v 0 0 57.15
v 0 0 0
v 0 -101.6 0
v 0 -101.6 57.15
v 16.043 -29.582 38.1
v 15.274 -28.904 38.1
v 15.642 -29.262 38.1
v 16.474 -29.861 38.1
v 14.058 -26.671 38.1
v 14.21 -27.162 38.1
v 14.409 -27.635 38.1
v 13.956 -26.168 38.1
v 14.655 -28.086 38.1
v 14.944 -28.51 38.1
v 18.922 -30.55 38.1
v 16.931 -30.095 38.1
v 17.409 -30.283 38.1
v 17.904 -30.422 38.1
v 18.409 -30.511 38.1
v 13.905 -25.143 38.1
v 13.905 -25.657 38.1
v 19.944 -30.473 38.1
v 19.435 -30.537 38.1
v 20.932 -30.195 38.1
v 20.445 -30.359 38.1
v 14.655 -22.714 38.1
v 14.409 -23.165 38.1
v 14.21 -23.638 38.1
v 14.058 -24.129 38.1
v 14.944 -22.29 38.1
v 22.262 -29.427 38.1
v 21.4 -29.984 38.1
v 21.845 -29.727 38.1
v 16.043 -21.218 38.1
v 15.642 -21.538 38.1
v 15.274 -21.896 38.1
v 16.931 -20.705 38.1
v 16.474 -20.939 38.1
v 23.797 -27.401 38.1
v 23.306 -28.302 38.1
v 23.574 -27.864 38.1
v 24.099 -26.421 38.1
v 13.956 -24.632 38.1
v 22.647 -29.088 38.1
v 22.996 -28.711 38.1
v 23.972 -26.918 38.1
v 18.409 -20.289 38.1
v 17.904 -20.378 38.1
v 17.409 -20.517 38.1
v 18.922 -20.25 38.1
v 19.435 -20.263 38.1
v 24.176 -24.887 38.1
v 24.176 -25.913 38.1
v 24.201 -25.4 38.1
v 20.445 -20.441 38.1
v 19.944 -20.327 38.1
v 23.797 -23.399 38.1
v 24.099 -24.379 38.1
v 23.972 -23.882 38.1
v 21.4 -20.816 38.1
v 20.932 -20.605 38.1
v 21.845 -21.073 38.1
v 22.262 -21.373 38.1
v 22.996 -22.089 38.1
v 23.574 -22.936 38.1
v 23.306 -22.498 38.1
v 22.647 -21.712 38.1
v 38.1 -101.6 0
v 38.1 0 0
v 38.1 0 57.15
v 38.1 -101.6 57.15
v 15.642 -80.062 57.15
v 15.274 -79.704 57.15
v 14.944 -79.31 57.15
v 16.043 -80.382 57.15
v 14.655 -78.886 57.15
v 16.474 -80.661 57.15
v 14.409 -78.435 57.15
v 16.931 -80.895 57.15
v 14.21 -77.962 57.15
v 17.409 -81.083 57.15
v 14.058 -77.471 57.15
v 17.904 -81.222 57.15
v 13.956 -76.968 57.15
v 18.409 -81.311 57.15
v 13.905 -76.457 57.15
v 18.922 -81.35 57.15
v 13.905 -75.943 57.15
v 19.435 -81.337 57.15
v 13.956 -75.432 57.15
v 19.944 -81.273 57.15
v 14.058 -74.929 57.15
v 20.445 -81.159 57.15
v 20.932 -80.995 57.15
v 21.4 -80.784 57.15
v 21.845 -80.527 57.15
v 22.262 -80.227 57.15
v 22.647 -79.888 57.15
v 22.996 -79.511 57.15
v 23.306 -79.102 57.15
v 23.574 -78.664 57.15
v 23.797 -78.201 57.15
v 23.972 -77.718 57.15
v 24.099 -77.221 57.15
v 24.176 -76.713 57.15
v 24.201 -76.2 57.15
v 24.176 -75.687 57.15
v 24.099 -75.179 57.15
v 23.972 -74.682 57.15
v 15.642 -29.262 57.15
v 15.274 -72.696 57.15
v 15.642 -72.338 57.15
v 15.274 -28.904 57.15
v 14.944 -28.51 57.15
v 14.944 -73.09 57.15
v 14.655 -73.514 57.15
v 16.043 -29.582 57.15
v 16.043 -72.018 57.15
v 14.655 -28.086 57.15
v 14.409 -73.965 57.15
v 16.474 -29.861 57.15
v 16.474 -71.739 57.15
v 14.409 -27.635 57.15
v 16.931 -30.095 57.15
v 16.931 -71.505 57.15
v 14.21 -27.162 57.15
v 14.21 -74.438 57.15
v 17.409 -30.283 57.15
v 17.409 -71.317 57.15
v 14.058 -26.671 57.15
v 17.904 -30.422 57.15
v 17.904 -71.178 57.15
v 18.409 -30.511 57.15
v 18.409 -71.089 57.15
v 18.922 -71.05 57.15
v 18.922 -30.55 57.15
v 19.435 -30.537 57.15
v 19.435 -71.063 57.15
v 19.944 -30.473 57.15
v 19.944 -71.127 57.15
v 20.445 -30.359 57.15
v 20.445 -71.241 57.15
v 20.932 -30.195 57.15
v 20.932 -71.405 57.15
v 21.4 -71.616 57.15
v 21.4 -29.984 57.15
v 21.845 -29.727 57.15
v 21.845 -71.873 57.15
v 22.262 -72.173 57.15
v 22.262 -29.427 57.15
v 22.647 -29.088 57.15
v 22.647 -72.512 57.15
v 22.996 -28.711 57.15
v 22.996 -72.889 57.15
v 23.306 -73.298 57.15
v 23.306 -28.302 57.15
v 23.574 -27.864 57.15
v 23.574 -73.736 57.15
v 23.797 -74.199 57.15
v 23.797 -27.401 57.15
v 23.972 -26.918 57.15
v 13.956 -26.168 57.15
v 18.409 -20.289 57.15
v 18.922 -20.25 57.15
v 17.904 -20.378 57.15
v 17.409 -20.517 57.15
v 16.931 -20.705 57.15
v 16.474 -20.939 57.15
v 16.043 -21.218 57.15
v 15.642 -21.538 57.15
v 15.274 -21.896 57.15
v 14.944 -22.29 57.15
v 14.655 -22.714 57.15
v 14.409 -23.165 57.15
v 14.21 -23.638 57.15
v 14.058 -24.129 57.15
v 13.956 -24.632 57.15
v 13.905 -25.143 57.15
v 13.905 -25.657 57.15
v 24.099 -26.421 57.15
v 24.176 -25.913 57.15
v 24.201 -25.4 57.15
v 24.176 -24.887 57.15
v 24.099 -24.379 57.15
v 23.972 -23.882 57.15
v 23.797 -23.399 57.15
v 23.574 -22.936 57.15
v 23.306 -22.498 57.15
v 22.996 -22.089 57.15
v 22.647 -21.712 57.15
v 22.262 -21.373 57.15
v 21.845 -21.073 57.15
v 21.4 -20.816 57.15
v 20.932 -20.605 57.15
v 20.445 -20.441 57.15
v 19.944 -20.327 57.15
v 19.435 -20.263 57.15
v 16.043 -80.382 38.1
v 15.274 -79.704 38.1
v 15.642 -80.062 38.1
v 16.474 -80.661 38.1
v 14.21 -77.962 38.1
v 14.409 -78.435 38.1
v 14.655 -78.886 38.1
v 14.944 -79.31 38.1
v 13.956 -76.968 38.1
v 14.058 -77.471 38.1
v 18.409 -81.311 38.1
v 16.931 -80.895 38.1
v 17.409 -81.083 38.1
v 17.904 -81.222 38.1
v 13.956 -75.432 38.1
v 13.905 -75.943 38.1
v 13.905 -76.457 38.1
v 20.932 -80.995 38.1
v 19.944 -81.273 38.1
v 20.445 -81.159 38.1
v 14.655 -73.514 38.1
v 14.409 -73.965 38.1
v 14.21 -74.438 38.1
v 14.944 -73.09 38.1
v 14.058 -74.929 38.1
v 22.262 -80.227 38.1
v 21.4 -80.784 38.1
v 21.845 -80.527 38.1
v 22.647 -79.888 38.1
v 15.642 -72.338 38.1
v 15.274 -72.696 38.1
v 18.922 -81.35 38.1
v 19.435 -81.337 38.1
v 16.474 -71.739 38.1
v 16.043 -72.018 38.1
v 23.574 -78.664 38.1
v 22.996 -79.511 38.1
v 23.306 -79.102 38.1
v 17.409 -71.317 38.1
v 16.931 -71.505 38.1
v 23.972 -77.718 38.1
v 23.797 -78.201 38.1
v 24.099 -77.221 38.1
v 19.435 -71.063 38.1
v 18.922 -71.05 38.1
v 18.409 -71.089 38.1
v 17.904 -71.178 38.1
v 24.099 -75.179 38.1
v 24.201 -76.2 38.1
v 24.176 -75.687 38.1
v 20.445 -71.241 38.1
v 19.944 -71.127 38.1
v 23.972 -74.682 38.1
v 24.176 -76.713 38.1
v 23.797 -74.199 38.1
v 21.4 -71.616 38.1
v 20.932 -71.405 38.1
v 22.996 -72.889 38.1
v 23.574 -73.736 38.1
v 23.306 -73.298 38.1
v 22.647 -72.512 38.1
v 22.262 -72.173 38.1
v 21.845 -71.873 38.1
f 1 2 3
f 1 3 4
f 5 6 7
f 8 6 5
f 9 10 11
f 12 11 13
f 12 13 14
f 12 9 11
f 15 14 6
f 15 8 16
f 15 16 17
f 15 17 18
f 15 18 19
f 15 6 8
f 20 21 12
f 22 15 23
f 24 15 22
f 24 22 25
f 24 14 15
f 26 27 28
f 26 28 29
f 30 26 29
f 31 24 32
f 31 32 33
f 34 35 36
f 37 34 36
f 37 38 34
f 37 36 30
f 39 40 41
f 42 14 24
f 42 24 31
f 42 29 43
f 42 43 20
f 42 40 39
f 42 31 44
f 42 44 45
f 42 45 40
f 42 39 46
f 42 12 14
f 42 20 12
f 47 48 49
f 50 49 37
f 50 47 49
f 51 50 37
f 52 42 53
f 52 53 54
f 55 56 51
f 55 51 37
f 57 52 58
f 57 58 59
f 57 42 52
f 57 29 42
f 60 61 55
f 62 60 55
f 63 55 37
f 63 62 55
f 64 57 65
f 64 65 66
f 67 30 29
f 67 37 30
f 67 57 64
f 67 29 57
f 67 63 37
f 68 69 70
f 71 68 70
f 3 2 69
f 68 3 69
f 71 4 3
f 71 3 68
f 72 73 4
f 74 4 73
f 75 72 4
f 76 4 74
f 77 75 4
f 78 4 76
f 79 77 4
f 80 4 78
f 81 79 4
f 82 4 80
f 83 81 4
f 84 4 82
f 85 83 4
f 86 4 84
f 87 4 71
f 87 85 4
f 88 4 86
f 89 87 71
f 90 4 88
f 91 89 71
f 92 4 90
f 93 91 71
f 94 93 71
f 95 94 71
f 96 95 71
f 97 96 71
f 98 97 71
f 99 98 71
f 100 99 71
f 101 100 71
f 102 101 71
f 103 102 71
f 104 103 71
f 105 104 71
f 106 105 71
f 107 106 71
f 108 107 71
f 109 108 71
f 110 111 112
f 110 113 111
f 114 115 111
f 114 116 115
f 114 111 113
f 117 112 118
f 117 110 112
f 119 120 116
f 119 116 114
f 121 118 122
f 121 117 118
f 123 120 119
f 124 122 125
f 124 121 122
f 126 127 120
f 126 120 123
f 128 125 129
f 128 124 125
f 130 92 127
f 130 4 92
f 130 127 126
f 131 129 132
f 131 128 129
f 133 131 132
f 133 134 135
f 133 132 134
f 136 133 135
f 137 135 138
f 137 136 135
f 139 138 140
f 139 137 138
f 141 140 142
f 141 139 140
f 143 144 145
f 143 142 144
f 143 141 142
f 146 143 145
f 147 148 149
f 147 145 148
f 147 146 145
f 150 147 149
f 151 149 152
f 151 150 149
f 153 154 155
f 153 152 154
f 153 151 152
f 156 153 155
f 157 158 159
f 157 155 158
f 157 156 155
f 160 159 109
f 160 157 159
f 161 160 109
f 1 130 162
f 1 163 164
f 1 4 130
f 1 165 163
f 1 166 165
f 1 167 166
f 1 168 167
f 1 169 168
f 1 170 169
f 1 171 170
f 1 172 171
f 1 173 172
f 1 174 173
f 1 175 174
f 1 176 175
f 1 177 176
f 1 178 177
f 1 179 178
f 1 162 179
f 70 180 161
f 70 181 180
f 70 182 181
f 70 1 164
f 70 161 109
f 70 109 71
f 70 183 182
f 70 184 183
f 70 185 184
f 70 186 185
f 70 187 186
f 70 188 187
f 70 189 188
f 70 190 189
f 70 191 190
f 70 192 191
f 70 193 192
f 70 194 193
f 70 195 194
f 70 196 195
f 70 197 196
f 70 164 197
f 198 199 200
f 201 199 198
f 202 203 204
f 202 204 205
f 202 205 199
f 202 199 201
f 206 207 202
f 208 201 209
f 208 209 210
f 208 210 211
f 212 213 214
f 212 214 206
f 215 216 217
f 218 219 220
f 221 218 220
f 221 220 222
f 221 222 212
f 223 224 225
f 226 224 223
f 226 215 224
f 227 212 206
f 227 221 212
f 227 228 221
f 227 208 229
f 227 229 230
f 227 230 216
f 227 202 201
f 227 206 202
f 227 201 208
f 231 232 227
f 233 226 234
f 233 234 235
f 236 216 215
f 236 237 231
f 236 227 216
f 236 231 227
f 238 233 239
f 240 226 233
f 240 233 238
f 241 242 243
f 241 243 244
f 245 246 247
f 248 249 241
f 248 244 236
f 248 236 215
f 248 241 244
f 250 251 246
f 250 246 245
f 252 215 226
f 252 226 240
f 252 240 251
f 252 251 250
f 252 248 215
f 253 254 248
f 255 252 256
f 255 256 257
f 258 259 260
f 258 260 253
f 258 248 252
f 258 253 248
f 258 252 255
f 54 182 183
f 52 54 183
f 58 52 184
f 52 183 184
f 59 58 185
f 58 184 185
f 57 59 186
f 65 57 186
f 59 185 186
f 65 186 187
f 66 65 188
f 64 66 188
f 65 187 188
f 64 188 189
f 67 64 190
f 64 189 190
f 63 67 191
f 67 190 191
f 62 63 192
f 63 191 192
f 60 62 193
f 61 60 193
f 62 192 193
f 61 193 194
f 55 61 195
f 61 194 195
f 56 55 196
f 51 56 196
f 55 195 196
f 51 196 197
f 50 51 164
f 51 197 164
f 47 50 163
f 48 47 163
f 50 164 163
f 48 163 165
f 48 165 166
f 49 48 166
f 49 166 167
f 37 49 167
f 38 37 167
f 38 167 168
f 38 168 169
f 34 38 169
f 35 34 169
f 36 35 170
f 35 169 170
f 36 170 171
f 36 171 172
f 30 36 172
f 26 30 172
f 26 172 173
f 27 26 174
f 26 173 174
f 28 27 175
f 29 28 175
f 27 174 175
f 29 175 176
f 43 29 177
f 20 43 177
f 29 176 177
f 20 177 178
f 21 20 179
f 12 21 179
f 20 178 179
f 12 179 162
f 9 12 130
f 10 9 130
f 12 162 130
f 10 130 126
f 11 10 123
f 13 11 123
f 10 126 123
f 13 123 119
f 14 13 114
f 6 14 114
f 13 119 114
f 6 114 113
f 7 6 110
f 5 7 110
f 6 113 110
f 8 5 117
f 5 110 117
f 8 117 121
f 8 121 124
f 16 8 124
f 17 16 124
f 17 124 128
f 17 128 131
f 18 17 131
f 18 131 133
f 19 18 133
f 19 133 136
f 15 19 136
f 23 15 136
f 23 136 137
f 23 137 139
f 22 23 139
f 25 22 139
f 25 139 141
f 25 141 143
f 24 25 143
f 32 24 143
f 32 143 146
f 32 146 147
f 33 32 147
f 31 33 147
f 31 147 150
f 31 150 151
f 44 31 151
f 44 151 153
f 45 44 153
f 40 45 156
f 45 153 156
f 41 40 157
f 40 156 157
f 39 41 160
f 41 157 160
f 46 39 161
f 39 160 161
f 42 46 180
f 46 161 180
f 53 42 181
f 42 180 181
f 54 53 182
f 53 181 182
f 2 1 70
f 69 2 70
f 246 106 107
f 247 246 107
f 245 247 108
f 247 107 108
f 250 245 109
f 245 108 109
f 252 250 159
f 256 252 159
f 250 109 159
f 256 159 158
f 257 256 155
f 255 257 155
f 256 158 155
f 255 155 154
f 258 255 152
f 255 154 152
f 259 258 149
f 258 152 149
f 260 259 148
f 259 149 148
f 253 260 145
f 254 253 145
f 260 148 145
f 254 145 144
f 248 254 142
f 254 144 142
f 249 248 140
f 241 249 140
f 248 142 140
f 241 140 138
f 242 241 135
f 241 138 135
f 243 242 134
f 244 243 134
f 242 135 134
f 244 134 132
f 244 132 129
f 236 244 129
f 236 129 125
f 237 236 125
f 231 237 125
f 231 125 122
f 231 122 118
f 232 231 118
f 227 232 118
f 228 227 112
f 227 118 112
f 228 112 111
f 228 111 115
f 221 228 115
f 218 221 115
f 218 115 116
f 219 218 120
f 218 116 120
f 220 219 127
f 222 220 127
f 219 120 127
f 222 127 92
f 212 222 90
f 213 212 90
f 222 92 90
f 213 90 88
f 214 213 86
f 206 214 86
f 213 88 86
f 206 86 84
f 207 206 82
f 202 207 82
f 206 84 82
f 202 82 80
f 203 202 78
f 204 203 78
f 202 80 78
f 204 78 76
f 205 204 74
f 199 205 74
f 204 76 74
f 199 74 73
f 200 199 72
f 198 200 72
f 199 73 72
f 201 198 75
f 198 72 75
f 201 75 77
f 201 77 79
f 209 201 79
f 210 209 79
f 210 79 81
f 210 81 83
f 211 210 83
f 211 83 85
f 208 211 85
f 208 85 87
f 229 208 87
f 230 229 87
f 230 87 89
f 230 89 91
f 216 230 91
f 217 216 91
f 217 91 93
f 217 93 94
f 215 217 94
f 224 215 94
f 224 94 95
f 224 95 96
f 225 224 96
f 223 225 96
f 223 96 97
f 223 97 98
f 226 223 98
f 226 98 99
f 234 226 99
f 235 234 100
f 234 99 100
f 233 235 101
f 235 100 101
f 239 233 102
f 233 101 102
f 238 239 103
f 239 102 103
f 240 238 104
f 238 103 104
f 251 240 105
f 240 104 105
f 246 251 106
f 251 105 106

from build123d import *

# Parameters (mm, degrees)
F0_W     = 38.1
F0_H     = 57.15
F1_DEPTH = 101.6
F2_R     = 5.15112
F3_DEPTH = 19.05


with BuildPart() as f1:
    # F0 (on Front) → F1 (new body)
    with BuildSketch(Plane.XZ):
        with Locations((19.05, 28.575)):
            Rectangle(F0_W, F0_H)
    extrude(amount=F1_DEPTH)

    # F2 (on face) → F3 (cut)
    with BuildSketch(Plane.XY.offset(57.15)):
        with Locations((19.05, -25.4)):
            Circle(F2_R)
        with Locations((19.05, -76.2)):
            Circle(F2_R)
    extrude(amount=-F3_DEPTH, mode=Mode.SUBTRACT)


solid = f1.part
